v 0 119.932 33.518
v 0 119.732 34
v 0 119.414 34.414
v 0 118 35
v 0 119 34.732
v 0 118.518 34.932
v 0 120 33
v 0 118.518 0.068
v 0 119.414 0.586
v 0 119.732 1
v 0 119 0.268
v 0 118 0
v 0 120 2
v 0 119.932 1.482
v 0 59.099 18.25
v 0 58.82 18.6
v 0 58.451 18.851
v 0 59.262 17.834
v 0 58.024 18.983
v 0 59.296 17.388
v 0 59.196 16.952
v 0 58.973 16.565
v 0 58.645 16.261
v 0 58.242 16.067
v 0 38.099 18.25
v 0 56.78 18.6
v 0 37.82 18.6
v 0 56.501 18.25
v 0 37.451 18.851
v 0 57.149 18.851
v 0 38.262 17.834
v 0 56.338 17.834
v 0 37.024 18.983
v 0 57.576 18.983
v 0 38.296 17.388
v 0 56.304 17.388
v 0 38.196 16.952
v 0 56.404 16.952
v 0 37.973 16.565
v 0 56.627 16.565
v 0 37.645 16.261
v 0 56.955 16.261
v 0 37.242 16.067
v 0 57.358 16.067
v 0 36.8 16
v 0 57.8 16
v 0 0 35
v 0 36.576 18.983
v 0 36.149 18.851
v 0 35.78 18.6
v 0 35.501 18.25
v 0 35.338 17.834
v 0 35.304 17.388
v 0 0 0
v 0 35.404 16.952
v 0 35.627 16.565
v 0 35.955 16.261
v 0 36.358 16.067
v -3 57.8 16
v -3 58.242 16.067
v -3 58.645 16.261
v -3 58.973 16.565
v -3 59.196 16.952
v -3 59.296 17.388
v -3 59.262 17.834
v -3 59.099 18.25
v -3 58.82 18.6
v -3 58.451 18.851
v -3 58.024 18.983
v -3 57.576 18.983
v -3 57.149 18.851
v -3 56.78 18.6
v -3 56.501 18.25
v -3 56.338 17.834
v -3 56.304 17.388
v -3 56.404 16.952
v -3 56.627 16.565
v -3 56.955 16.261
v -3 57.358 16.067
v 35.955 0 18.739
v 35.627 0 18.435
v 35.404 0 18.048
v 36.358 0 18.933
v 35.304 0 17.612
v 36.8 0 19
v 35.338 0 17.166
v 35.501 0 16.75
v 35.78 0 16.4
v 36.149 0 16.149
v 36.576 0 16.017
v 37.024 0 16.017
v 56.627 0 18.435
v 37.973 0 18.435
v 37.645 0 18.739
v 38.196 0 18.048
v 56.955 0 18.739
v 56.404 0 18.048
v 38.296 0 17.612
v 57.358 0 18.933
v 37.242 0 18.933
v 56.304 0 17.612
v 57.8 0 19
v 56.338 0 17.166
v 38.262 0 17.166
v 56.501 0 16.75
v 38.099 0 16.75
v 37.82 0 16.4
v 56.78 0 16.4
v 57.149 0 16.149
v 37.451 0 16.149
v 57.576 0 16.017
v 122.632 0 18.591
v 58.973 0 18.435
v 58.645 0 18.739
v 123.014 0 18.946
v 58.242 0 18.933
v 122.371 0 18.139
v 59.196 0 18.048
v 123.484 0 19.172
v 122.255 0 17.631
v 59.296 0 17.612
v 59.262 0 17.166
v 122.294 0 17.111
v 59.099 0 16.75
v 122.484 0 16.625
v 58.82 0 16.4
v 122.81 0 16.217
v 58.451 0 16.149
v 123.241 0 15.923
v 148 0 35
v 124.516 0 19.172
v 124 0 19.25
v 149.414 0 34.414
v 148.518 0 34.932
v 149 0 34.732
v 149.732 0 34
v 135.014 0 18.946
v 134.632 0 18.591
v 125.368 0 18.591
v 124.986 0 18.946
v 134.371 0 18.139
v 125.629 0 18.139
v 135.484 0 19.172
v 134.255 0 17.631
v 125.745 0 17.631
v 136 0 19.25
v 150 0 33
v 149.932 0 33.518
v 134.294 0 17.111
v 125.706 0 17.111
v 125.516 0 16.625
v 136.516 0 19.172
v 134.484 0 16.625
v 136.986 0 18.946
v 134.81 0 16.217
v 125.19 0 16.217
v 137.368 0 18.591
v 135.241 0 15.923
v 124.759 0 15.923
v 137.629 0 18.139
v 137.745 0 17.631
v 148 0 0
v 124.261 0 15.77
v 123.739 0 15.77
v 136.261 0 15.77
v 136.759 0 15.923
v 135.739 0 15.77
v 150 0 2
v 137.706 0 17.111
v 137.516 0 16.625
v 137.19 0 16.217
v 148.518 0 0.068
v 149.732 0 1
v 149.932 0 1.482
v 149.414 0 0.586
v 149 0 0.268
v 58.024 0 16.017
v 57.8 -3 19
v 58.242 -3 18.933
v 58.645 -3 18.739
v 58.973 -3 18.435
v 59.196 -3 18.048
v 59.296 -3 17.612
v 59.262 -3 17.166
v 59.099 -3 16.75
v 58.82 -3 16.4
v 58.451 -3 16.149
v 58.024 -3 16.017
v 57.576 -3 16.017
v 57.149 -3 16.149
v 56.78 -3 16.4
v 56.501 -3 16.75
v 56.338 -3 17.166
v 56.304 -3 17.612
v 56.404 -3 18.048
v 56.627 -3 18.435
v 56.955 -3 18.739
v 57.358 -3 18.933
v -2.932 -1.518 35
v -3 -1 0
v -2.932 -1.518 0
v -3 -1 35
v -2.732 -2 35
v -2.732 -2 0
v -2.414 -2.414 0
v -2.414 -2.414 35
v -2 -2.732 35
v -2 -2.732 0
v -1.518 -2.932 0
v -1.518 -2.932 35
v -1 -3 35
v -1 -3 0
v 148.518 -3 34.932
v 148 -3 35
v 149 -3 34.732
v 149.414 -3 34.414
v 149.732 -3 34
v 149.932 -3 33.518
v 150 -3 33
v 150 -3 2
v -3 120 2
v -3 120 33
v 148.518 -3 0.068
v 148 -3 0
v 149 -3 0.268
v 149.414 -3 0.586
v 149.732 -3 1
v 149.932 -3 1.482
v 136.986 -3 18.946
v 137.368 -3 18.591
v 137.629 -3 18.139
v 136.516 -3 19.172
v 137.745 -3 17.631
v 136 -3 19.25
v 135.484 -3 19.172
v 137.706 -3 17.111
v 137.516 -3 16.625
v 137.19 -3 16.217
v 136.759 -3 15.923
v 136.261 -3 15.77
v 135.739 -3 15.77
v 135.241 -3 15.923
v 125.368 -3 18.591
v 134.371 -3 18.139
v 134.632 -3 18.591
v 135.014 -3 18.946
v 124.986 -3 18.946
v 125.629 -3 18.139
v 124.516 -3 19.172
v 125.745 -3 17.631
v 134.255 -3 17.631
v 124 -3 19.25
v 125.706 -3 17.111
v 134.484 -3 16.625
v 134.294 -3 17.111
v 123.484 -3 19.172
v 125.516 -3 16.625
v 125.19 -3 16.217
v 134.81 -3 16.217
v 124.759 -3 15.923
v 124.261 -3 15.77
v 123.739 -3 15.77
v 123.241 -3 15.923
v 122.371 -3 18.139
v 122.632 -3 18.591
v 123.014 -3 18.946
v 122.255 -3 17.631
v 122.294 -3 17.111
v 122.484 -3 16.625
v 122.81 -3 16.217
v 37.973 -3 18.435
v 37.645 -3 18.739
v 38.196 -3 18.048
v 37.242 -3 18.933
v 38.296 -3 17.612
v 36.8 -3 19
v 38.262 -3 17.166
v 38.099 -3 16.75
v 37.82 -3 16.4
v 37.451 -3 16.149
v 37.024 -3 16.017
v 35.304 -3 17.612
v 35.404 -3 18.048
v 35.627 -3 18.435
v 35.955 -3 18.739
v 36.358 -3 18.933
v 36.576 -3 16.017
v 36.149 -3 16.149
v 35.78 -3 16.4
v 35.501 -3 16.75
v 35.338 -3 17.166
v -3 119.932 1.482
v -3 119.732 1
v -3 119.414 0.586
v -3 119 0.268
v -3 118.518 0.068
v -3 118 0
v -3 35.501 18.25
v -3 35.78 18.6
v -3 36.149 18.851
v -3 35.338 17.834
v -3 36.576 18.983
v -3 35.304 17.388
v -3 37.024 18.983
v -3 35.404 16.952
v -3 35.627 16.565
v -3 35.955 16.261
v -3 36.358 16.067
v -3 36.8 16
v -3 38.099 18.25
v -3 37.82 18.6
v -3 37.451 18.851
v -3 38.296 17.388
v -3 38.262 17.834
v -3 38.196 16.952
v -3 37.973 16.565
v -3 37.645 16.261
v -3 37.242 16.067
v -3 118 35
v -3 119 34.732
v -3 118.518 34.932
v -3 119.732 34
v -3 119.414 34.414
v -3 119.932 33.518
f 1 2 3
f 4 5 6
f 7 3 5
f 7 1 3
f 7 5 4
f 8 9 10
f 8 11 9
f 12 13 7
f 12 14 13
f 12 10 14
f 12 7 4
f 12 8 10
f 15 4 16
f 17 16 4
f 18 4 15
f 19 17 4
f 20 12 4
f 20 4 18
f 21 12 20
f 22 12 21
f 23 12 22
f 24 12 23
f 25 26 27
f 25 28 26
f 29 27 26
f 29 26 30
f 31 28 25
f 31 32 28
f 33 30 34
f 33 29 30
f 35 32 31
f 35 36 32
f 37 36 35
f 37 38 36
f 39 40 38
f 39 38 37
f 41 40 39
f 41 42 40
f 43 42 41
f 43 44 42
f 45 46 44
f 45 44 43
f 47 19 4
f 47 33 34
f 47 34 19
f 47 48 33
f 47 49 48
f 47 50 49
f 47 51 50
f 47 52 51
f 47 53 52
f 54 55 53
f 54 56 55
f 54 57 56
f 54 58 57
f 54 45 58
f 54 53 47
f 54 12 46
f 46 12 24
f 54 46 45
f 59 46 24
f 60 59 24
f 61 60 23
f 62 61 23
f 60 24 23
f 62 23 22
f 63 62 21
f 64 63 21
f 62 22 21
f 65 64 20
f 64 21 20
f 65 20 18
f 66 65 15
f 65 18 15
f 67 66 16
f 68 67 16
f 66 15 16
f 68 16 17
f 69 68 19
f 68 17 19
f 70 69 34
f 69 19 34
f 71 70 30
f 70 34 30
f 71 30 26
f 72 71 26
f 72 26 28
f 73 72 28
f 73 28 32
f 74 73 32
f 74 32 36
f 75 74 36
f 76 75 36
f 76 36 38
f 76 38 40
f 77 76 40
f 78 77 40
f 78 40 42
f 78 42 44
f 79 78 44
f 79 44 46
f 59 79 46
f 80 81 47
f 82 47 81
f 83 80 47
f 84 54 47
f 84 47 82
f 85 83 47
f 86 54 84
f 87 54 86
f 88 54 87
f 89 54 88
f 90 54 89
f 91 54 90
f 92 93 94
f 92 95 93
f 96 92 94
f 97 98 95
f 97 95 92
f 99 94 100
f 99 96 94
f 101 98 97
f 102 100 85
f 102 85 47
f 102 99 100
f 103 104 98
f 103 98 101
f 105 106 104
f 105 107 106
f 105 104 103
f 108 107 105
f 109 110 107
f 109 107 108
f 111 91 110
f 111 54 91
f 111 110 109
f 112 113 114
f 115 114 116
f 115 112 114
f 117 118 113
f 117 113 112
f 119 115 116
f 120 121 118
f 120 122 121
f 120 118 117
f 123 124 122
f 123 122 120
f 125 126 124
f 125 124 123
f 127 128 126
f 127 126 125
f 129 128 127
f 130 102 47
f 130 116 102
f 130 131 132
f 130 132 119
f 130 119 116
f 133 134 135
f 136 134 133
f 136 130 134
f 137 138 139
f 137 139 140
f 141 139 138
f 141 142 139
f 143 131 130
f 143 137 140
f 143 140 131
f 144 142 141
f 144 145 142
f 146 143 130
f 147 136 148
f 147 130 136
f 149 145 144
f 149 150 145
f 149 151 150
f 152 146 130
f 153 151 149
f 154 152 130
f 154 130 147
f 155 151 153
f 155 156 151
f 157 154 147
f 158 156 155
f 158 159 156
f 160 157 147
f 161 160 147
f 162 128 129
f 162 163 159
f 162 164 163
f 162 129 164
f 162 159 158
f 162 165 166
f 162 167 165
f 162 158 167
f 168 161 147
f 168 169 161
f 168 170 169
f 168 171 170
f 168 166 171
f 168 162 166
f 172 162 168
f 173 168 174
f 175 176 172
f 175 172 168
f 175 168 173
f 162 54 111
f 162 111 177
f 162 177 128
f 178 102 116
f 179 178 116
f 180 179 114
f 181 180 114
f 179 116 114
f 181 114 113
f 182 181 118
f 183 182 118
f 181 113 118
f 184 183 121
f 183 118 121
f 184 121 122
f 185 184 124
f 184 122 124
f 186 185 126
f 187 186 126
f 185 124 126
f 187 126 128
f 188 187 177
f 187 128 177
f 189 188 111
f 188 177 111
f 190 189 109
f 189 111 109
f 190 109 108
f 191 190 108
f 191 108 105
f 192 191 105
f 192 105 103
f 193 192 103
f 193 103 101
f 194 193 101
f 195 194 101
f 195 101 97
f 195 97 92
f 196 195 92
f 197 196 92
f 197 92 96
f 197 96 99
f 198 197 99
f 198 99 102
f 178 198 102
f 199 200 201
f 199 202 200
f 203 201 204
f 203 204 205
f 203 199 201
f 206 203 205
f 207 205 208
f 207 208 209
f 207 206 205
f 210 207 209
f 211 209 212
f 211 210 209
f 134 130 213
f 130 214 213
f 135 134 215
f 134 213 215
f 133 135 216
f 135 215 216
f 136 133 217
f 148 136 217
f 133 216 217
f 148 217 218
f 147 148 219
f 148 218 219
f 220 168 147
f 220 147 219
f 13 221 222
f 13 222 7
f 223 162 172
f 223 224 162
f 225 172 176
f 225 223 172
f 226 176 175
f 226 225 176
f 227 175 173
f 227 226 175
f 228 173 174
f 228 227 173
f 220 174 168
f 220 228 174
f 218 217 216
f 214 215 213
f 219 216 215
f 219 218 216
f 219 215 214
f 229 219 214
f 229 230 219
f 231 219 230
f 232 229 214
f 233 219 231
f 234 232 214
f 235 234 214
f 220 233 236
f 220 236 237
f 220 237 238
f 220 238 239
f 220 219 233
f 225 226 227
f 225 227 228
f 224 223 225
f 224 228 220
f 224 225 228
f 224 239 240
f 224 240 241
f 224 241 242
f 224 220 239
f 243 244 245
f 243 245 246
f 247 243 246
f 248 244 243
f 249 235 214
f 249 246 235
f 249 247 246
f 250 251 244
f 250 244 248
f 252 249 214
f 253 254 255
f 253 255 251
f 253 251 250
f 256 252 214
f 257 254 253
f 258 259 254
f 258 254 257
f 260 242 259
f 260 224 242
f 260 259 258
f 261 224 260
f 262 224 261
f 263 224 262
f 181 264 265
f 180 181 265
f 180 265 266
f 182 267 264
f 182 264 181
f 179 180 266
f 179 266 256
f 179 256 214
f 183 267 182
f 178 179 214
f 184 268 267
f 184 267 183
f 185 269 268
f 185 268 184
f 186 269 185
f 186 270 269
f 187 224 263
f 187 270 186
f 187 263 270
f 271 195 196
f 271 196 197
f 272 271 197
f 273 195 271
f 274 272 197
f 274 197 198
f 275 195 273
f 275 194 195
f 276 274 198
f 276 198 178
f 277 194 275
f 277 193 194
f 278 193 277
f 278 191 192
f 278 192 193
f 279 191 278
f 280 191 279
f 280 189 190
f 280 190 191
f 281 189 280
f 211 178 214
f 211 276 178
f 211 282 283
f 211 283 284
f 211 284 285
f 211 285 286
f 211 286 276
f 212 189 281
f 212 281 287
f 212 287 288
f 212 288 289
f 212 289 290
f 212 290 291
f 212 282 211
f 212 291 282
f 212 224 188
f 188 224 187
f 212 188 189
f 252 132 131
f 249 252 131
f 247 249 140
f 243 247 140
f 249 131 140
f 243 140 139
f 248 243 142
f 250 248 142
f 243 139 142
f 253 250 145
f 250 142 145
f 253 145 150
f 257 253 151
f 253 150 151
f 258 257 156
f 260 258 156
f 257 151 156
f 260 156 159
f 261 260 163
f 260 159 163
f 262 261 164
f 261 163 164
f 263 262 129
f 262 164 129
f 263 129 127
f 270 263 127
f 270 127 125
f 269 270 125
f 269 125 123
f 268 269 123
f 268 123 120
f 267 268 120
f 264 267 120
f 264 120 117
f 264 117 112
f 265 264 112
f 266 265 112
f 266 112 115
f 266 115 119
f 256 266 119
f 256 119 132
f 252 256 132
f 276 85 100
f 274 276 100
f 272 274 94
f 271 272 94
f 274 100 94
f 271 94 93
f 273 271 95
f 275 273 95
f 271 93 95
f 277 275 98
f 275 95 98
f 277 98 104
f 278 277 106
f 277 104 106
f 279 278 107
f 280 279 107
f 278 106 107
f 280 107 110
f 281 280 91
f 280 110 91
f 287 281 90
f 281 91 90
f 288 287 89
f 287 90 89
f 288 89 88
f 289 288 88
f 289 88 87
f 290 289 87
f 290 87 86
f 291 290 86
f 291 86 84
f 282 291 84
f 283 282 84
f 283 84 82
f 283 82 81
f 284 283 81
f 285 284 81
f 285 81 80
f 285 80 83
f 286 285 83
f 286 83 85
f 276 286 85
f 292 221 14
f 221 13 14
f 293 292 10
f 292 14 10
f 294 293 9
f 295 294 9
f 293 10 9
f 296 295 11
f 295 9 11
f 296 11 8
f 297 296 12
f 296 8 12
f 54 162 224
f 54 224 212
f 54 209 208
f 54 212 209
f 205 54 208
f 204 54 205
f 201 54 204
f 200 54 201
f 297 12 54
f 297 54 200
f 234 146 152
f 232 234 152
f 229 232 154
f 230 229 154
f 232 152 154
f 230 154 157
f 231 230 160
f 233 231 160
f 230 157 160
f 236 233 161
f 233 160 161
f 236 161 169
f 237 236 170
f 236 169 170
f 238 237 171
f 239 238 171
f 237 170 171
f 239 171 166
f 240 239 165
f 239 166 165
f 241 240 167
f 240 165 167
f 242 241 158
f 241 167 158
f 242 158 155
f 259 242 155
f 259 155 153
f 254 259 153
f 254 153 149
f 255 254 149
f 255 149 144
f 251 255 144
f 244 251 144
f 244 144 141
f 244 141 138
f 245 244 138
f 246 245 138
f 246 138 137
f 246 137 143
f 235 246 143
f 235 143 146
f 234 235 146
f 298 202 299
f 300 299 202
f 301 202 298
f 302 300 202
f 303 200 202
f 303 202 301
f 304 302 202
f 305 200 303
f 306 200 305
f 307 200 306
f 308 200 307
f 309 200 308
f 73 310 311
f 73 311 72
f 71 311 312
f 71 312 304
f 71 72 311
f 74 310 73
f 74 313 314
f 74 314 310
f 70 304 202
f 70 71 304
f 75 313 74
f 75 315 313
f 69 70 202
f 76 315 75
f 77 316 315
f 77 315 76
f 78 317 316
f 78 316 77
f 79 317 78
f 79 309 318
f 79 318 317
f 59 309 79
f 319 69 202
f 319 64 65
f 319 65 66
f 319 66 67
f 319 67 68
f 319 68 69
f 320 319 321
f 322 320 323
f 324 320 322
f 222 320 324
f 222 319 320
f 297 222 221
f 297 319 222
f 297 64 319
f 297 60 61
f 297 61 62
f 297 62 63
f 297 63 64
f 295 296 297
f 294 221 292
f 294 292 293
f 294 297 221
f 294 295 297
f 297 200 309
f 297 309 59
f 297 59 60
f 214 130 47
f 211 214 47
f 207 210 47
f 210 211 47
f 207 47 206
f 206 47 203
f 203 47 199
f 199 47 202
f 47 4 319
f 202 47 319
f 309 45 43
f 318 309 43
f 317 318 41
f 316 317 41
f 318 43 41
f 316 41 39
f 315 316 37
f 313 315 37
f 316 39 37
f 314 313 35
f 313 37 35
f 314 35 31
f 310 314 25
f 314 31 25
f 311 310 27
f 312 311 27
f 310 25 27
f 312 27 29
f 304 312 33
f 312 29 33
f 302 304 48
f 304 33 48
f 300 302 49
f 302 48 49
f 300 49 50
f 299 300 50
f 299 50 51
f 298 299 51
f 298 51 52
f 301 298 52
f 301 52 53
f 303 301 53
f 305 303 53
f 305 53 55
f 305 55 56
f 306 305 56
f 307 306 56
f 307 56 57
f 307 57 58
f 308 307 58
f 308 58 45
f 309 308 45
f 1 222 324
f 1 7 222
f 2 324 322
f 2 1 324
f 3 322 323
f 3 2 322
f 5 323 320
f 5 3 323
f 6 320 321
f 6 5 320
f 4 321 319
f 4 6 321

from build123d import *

# Parameters (mm, degrees)
EXTRU_MINCE1_DEPTH      = 35
ESQUISSE2_R             = 1.75
ENL_V_MAT_EXTRU_1_DEPTH = 10
CONG_1_R                = 2
ESQUISSE3_R             = 1.5
ENL_V_MAT_EXTRU_2_DEPTH = 10
ESQUISSE4_R             = 1.5
ENL_V_MAT_EXTRU_3_DEPTH = 10


with BuildPart() as part:
    # Esquisse1 → Extru.-Mince1 (new body)
    with BuildSketch(Plane.XY):
        Polygon((0, 120), (0, 0), (150, 0), (150, -3), (-3, -3), (-3, 120), align=None)
    extrude(amount=EXTRU_MINCE1_DEPTH)

    # Esquisse2 → Enlèv. mat.-Extru.1 (cut)
    with BuildSketch(Plane(origin=(0, 0, 0), x_dir=(1, 0, 0), z_dir=(0, 1, 0))):
        with Locations(Location((124, -17.5, 0), (0, 0, 270))):
            Circle(ESQUISSE2_R)
        with Locations(Location((136, -17.5, 0), (0, 0, 270))):
            Circle(ESQUISSE2_R)
    extrude(amount=-ENL_V_MAT_EXTRU_1_DEPTH, mode=Mode.SUBTRACT)

    # Congé1
    cong_1_edges = [part.edges().sort_by_distance(p)[0] for p in [
        (-1.5, 120, 35),
        (-1.5, 120, 0),
        (150, -1.5, 0),
        (150, -1.5, 35),
        (-3, -3, 17.5),
    ]]
    fillet(cong_1_edges, radius=CONG_1_R)

    # Esquisse3 → Enlèv. mat.-Extru.2 (cut)
    with BuildSketch(Plane(origin=(0, 0, 0), x_dir=(1, 0, 0), z_dir=(0, 1, 0))):
        with Locations(Location((36.8, -17.5, 0), (0, 0, 270))):
            Circle(ESQUISSE3_R)
        with Locations(Location((57.8, -17.5, 0), (0, 0, 270))):
            Circle(ESQUISSE3_R)
    extrude(amount=-ENL_V_MAT_EXTRU_2_DEPTH, mode=Mode.SUBTRACT)

    # Esquisse4 → Enlèv. mat.-Extru.3 (cut)
    with BuildSketch(Plane(origin=(0, 0, 0), x_dir=(0, 0, -1), z_dir=(1, 0, 0))):
        with Locations((-17.5, 36.8)):
            Circle(ESQUISSE4_R)
        with Locations((-17.5, 57.8)):
            Circle(ESQUISSE4_R)
    extrude(amount=-ENL_V_MAT_EXTRU_3_DEPTH, mode=Mode.SUBTRACT)


solid = part.part
